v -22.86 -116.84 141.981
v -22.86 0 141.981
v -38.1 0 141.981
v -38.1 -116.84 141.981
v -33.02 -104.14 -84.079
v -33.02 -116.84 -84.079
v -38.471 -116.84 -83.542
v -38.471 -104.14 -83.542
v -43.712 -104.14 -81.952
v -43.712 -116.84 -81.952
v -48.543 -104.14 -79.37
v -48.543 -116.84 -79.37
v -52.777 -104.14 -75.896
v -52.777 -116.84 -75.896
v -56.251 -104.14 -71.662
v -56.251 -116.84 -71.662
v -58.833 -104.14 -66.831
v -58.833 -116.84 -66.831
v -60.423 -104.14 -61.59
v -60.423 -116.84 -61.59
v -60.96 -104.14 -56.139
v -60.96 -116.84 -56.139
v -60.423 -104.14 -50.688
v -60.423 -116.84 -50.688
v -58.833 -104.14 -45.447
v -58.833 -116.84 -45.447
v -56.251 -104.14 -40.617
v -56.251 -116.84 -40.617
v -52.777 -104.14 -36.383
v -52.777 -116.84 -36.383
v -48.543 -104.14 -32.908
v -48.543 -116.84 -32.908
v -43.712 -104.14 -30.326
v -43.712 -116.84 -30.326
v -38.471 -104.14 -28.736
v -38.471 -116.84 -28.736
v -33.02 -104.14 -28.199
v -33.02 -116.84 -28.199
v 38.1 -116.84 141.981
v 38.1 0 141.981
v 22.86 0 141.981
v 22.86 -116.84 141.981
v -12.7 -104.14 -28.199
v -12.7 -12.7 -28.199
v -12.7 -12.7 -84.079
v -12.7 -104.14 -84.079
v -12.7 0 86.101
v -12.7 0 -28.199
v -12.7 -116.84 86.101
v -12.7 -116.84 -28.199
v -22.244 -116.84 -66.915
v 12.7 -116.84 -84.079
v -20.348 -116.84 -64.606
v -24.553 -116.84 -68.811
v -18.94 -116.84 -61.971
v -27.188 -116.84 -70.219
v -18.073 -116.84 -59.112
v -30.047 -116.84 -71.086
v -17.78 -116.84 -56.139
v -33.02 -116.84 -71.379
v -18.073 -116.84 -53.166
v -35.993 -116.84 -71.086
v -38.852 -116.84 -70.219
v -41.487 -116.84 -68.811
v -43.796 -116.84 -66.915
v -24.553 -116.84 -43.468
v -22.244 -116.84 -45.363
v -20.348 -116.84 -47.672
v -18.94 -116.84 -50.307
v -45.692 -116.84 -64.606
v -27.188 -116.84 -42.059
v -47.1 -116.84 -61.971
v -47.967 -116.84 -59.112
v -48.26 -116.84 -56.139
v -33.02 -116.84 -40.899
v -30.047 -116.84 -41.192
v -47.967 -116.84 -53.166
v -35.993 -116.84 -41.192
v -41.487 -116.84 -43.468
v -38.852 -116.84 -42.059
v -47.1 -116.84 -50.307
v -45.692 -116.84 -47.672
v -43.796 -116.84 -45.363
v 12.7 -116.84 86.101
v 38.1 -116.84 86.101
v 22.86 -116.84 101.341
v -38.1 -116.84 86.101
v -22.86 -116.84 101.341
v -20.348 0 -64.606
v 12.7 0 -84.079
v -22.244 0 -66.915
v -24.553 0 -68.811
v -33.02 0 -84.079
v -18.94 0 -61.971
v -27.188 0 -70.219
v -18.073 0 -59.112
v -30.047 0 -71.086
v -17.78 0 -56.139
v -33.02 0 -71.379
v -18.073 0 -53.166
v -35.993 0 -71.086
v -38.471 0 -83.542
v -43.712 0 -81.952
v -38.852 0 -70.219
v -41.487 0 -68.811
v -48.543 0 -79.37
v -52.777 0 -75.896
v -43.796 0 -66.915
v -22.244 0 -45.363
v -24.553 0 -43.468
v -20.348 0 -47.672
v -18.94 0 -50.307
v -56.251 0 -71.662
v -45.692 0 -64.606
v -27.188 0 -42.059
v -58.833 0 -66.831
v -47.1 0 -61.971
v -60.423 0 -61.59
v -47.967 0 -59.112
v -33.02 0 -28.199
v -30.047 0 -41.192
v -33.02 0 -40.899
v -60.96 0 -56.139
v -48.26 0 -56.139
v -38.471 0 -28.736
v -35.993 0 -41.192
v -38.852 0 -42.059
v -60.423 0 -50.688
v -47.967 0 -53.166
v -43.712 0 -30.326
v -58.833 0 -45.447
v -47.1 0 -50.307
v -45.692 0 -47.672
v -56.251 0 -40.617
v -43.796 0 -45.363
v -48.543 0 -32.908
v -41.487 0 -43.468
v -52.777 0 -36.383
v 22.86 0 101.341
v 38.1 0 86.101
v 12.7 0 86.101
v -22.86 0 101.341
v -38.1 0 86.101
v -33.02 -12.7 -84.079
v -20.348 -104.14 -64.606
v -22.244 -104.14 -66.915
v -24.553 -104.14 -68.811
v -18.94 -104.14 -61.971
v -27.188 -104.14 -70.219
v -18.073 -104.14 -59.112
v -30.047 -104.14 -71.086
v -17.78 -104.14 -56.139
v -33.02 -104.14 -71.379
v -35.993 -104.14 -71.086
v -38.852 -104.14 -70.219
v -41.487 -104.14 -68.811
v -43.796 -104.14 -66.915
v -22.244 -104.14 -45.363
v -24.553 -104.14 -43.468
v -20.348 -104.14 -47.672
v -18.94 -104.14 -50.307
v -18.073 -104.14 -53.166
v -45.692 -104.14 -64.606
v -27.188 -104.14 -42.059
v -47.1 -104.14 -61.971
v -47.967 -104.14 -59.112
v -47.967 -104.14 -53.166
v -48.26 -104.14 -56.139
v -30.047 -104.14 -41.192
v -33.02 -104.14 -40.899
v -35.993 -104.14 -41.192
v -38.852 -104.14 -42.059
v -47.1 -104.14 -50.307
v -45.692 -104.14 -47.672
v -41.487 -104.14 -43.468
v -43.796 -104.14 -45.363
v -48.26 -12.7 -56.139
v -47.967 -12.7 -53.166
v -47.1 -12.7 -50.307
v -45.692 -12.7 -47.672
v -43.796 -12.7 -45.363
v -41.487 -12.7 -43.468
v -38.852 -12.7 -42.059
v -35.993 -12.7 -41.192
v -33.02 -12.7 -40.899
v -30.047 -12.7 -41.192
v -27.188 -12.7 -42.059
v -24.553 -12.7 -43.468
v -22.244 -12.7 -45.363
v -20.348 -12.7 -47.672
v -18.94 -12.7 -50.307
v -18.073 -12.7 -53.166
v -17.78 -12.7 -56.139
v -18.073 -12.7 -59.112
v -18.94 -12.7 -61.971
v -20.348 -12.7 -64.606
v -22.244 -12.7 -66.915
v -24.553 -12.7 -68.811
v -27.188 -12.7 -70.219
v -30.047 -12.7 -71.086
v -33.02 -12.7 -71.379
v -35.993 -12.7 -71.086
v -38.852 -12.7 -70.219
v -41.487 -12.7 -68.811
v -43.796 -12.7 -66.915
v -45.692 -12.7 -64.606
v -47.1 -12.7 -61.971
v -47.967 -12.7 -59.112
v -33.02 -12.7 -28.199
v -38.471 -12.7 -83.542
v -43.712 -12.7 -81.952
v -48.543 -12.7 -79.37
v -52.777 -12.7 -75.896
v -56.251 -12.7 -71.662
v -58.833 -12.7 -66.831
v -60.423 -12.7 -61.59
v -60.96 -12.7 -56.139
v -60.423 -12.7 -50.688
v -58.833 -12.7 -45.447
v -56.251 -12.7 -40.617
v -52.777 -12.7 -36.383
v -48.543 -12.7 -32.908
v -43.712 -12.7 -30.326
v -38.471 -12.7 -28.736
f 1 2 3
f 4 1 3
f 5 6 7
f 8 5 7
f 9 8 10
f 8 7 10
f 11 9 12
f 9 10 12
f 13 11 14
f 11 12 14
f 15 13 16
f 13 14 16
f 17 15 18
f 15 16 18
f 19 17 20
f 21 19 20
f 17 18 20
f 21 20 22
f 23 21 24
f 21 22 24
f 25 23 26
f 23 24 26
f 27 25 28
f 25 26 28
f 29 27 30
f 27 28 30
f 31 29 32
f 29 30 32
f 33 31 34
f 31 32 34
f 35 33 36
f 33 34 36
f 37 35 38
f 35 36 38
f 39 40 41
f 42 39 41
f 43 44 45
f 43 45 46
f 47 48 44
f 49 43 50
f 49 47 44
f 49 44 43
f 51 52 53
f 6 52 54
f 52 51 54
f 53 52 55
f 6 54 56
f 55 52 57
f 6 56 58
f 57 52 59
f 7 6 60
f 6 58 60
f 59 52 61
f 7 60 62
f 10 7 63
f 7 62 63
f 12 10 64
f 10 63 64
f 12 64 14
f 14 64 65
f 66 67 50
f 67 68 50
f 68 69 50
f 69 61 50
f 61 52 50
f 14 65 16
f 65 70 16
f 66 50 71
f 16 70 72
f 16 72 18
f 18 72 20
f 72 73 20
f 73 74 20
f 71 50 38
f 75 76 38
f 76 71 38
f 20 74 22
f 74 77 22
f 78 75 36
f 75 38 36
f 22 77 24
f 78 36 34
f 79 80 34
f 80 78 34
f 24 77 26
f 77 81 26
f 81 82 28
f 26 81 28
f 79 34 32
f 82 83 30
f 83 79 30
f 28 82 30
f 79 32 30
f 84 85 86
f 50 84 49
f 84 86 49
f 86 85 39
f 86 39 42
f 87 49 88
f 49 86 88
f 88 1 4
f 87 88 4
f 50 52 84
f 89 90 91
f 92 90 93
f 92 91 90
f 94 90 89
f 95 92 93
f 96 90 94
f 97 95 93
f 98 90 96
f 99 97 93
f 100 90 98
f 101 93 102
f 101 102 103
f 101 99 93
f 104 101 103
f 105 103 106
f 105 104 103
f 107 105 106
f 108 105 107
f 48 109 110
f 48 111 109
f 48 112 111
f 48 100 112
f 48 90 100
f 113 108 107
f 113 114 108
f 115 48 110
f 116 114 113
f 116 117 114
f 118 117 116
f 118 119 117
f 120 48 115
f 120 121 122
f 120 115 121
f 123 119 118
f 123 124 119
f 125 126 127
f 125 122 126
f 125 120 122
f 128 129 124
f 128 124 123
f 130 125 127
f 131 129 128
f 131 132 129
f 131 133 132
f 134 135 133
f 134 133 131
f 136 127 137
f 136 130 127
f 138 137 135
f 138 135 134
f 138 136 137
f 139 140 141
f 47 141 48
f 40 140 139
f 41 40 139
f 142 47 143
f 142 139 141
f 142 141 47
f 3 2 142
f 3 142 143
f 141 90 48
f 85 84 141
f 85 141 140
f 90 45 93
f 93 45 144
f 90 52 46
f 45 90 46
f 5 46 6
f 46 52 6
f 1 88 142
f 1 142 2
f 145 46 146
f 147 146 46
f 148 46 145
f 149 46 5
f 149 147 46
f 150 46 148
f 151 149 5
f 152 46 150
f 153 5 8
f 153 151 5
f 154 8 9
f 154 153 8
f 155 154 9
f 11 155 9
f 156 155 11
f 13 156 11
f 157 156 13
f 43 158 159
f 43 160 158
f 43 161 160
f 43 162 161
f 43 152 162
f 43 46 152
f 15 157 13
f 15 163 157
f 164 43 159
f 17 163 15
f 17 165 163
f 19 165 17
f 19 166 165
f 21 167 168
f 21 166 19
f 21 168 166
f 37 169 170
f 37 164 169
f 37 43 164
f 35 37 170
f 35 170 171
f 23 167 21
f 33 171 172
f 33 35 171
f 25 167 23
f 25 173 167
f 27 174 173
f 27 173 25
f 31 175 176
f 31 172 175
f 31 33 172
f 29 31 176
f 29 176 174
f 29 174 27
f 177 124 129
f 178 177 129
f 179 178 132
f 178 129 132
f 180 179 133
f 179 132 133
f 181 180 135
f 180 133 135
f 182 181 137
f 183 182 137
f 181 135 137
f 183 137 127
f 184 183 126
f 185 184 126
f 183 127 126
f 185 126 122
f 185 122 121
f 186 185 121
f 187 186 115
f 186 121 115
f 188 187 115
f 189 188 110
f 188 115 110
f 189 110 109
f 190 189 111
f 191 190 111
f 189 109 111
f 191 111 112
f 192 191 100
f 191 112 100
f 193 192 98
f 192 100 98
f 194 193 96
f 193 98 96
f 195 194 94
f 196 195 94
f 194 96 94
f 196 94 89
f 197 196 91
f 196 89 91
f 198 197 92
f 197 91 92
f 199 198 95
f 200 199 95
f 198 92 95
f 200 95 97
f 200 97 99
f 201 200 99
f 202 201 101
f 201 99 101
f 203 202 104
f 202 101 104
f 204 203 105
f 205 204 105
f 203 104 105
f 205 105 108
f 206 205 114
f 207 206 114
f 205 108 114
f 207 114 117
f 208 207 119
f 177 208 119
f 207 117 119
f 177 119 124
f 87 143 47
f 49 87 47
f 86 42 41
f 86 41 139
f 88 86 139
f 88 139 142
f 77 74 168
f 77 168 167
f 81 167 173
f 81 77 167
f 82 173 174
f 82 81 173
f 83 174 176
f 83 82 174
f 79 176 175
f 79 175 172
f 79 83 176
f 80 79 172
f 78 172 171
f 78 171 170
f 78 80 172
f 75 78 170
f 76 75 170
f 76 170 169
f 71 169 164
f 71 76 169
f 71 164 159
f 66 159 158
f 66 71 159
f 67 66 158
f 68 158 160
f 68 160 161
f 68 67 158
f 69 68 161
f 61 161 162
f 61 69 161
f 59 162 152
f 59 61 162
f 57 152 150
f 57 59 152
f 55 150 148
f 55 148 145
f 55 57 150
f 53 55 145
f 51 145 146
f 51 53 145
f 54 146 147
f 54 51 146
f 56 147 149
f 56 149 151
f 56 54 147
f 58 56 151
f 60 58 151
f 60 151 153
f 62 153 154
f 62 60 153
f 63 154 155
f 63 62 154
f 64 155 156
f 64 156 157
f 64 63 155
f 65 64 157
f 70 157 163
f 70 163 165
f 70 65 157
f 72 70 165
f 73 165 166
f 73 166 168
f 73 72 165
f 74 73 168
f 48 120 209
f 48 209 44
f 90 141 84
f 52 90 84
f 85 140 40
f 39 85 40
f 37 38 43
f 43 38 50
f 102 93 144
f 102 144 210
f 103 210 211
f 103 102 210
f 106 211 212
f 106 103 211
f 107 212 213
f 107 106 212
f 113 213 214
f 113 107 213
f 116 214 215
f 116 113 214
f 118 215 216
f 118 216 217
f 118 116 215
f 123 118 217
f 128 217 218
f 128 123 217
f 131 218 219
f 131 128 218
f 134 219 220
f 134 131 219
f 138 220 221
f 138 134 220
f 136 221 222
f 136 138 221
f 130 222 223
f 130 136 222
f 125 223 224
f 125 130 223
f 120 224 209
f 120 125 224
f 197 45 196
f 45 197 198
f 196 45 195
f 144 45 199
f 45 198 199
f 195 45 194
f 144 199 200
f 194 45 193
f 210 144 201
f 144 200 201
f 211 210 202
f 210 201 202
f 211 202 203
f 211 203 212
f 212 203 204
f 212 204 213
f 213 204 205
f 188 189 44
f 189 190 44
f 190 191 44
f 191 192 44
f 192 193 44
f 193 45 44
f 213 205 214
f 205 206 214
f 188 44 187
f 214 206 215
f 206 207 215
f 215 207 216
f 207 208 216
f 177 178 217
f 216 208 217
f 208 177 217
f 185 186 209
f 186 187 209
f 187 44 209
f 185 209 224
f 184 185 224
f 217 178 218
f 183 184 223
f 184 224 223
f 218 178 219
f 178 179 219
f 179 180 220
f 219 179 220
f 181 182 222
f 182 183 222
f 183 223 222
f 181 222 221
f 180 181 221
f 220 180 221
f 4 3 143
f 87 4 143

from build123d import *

# Parameters (mm, degrees)
F1_DEPTH = 116.84
F2_W     = 25.4
F2_H     = 116.84
F3_DEPTH = 170.18
F4_R     = 15.24
F5_DEPTH = 12.7


with BuildPart() as f1:
    # F0 (on Front) → F1 (new body)
    with BuildSketch(Plane.XZ):
        Polygon((-38.1, 86.1008339764), (0, 86.1008339764), (38.1, 86.1008339764), (38.1, 141.9808339764), (22.86, 141.9808339764), (22.86, 101.3408339764), (0, 101.3408339764), (-22.86, 101.3408339764), (-22.86, 141.9808339764), (-38.1, 141.9808339764), align=None)
    extrude(amount=F1_DEPTH)

    # F2 (on face) → F3 (join)
    with BuildSketch(Plane(origin=(0, 0, 86.1008339764), x_dir=(1, 0, 0), z_dir=(0, 0, -1))):
        with Locations((0, 58.42)):
            Rectangle(F2_W, F2_H)
    extrude(amount=F3_DEPTH)

    # F4 (on face) → F5 (join)
    with BuildSketch(Plane(origin=(0, 0, 0), x_dir=(-1, 0, 0), z_dir=(0, 1, 0))):
        with BuildLine():
            Line((12.7, -84.0791660236), (33.02, -84.0791660236))
            ThreePointArc((33.02, -84.0791660236), (60.96, -56.1391660236), (33.02, -28.1991660236))
            Line((33.02, -28.1991660236), (12.7, -28.1991660236))
            Line((12.7, -28.1991660236), (12.7, -84.0791660236))
        make_face()
        with Locations((33.02, -56.1391660236)):
            Circle(F4_R, mode=Mode.SUBTRACT)
    extrude(amount=-F5_DEPTH)

    # F7: F1 across plane


with BuildPart() as f1_1:
    add(f1.part)
    add(f1.part.mirror(Plane.XZ.offset(58.42)))


solid = f1_1.part
